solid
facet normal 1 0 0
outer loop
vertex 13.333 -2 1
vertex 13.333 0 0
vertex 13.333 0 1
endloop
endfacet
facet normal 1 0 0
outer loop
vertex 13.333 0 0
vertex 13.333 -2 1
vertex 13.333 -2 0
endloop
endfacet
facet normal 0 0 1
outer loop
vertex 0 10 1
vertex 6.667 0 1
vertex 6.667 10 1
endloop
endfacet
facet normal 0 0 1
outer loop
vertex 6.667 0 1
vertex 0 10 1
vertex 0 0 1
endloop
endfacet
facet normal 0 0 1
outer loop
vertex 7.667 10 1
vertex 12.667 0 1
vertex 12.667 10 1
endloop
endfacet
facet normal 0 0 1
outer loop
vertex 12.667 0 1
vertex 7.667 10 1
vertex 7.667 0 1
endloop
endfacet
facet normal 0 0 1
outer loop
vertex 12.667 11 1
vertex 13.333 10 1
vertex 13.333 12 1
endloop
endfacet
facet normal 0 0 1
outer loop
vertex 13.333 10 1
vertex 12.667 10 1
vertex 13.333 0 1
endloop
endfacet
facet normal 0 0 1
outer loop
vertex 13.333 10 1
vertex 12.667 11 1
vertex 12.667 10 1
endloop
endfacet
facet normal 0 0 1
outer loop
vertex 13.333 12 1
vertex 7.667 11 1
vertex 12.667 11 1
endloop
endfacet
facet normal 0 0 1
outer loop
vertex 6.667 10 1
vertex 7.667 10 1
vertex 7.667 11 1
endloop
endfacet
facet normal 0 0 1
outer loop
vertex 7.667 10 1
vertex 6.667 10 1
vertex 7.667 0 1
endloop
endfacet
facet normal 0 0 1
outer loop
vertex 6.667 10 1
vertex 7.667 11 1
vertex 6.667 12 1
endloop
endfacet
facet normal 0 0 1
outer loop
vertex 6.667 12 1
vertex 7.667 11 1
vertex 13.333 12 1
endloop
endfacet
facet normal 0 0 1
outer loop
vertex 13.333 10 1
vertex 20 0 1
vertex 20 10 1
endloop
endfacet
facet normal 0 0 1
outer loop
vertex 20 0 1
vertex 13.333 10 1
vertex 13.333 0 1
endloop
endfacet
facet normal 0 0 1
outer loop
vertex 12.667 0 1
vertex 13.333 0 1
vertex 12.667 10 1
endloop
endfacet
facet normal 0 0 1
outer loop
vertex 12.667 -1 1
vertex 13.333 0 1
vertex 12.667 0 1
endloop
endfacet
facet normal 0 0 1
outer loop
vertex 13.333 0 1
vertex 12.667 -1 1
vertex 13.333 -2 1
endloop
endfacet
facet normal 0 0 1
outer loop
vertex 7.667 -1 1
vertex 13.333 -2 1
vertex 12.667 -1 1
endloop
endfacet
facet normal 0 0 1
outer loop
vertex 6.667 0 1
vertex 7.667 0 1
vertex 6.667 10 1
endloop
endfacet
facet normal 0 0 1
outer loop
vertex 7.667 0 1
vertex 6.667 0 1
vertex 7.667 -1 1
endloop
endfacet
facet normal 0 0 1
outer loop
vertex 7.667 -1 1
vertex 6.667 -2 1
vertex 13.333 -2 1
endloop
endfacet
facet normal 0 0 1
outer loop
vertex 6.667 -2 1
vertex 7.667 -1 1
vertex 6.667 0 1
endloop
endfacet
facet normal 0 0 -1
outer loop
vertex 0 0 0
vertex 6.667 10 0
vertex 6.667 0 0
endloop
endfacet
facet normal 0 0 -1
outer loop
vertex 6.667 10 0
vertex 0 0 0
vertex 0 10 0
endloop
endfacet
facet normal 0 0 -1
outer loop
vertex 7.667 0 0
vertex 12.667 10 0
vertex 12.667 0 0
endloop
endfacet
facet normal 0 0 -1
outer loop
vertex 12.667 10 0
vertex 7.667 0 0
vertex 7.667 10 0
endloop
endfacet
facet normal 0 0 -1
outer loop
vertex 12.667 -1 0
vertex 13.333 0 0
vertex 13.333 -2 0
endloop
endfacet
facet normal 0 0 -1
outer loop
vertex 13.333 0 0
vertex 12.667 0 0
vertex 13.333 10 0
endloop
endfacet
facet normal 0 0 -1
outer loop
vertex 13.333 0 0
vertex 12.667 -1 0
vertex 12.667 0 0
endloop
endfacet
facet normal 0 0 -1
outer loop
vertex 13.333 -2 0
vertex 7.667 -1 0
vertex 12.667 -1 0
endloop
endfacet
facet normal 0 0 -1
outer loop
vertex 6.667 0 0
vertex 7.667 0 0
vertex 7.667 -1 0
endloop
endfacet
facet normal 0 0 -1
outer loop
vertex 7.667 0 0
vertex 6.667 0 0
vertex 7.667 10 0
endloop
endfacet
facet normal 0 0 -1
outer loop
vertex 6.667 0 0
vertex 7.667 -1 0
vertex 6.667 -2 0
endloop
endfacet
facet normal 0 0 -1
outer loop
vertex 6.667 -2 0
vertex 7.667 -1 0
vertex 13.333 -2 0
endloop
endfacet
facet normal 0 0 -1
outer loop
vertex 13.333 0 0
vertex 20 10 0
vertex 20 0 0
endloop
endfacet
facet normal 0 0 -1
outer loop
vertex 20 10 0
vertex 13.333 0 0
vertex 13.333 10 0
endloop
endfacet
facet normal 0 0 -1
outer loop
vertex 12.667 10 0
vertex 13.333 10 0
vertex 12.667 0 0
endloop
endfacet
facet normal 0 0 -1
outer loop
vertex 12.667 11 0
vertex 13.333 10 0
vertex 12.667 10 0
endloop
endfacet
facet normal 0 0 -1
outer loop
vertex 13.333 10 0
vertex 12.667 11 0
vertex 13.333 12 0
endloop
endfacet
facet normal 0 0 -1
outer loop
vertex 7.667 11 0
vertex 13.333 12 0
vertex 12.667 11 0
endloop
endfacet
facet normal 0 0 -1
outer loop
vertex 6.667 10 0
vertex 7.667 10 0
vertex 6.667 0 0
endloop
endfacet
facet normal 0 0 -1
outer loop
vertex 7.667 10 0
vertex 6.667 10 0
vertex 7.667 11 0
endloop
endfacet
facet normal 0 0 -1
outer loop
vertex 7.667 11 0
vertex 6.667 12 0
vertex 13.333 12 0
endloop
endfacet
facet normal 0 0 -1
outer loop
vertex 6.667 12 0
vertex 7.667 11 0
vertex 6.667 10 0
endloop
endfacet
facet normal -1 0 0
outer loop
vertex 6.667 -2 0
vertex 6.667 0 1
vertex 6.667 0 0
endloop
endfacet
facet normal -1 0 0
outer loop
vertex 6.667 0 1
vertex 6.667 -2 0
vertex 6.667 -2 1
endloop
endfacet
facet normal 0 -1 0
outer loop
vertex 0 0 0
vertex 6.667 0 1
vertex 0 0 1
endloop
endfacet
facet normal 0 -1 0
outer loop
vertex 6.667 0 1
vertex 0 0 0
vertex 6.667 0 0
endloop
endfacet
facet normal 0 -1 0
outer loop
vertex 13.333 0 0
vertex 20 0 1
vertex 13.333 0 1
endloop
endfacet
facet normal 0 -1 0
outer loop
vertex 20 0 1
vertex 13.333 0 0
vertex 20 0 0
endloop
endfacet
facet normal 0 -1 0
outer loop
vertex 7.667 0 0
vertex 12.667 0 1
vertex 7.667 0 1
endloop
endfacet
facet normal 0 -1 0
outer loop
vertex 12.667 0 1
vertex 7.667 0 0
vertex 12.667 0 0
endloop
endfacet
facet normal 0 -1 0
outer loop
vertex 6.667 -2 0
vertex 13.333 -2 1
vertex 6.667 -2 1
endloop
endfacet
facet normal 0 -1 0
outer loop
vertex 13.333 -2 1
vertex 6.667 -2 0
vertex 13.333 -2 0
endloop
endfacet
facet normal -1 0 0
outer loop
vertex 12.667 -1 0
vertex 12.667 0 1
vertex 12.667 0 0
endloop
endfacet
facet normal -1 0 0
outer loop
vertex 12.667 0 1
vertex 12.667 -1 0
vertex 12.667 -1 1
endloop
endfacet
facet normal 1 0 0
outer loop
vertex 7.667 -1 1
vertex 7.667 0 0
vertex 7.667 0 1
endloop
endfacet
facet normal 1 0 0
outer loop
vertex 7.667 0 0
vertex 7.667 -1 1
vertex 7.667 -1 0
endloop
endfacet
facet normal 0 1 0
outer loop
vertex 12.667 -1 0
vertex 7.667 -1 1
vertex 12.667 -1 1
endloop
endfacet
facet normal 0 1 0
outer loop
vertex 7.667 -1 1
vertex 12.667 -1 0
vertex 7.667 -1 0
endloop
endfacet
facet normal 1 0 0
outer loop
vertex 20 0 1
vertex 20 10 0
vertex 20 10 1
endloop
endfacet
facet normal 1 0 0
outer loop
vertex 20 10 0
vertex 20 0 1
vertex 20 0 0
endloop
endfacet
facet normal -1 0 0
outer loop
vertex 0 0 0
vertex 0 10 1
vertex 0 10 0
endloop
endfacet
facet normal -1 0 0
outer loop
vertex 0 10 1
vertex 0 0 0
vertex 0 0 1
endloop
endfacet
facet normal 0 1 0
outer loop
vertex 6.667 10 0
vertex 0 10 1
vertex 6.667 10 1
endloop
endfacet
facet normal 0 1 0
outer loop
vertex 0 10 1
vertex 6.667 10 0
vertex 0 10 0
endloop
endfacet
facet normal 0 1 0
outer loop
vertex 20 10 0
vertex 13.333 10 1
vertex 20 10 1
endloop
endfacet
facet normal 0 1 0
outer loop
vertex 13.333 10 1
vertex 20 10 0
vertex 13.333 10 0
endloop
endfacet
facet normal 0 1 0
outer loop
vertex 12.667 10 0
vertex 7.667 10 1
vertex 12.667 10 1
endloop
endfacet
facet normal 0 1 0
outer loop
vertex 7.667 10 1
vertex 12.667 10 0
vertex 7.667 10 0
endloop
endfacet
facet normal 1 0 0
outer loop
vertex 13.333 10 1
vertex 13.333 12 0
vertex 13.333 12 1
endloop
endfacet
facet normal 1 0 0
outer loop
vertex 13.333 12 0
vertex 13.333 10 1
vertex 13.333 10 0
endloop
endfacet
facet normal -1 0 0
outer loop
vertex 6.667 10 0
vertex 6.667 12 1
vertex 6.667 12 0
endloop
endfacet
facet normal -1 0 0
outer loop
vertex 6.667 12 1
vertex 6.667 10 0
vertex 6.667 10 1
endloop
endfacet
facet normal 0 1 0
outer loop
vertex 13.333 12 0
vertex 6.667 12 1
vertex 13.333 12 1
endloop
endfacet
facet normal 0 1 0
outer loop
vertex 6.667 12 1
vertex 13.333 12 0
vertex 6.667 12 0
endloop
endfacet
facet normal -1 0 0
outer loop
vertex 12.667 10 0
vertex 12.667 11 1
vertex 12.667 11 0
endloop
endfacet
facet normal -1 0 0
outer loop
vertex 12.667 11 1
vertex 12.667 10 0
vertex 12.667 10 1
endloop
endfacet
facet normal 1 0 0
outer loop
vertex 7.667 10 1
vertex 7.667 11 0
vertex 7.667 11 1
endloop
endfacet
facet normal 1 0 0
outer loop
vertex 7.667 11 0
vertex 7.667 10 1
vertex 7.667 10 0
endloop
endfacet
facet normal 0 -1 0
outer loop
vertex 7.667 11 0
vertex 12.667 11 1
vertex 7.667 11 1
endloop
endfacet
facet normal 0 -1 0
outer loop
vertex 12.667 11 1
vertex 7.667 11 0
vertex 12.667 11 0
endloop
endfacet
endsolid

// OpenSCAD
/**
 * top.scad is part of Paper Laptop.
 * It describes a top of the lid of the laptop.
 *
 * @author R. S. Doiel, <rsdoiel@gmail.com>
 * copyright (c) 2016 all rights reserved
 * Released under a BSD 2-clause license
 */
/**
 * bottom.scad is part of Paper Laptop.
 * It describes lower surface of the base.
 *
 * @author R. S. Doiel, <rsdoiel@gmail.com>
 * copyright (c) 2016 all rights reserved
 * Released under a BSD 2-clause license
 */
 
/*
 * bottom - panel demisions for base.
 * @param length is he x value of base rectangle
 * @param width is the y value of the base rectangle
 */
module bottom(length, width) {
    color([0,0,1]) cube([length, width, 1]); 
}

bottom(20, 10, 1);
/**
 * inside-keyboard.scad is part of Paper Laptop.
 * It describes the inside panel mount for keyboard,
 * trackpad, and any other input surface.
 *
 * @author R. S. Doiel, <rsdoiel@gmail.com>
 * copyright (c) 2016 all rights reserved
 * Released under a BSD 2-clause license
 */
module insideKeyboard(length, width) {
    /* main surface for keyboard mounts */
    color([0,0,1]) cube([length, width, 1]); 
    /* handle extension */
    difference() {
        translate([length/3, (width/5)*-1, 0]) {
            color([0,1,0]) cube([length/3, width/5, 1]);
        }    
        translate([(length/3)*1.15, (width/10)*-1, 0]) {
            //color([1,0,0]) 
            cube([(length/3)*0.75, width/10, 1]);
        }
    }
}

insideKeyboard(20, 10);/**
 * inside-screen.scad is part of Paper Laptop.
 * It describes the inner side of the lid holding
 * the LCD panel.
 *
 * @author R. S. Doiel, <rsdoiel@gmail.com>
 * copyright (c) 2016 all rights reserved
 * Released under a BSD 2-clause license
 */
module insideScreen(length, width) {
    translate([0, width, 0]) {
        mirror() {
            rotate(180) {
                /* main surface for keyboard mounts */
                color([0,0,1]) cube([length, width, 1]); 
                /* handle extension */
                difference() {
                    translate([length/3, (width/5)*-1, 0]) {
                        color([0,1,0]) cube([length/3, width/5, 1]);
                    }    
                    translate([(length/3)*1.15, (width/10)*-1, 0]) {
                        //color([1,0,0]) 
                        cube([(length/3)*0.75, width/10, 1]);
                    }
                }
            }
        }
    }
}

insideScreen(20, 10);
/**
 * side-back-bottom.scad is part of Paper Laptop.
 * It describes the bottom back side of the base.
 *
 * @author R. S. Doiel, <rsdoiel@gmail.com>
 * copyright (c) 2016 all rights reserved
 * Released under a BSD 2-clause license
 */
/**
 * side-back-top.scad is part of Paper Laptop.
 * It describes the top back  side of the lid.
 *
 * @author R. S. Doiel, <rsdoiel@gmail.com>
 * copyright (c) 2016 all rights reserved
 * Released under a BSD 2-clause license
 */
/**
 * side-front-bottom.scad is part of Paper Laptop.
 * It describes the bottom front side of the base.
 *
 * @author R. S. Doiel, <rsdoiel@gmail.com>
 * copyright (c) 2016 all rights reserved
 * Released under a BSD 2-clause license
 */
/**
 * side-front-top.scad is part of Paper Laptop.
 * It describes the top front side of the lid.
 *
 * @author R. S. Doiel, <rsdoiel@gmail.com>
 * copyright (c) 2016 all rights reserved
 * Released under a BSD 2-clause license
 */
/**
 * side-left-bottom.scad is part of Paper Laptop.
 * It describes the bottom left side of the base.
 *
 * @author R. S. Doiel, <rsdoiel@gmail.com>
 * copyright (c) 2016 all rights reserved
 * Released under a BSD 2-clause license
 */
/**
 * side-left-top.scad is part of Paper Laptop.
 * It describes the top left side of the lid.
 *
 * @author R. S. Doiel, <rsdoiel@gmail.com>
 * copyright (c) 2016 all rights reserved
 * Released under a BSD 2-clause license
 */
/**
 * side-right-bottom.scad is part of Paper Laptop.
 * It describes the bottom right side of the bad.
 *
 * @author R. S. Doiel, <rsdoiel@gmail.com>
 * copyright (c) 2016 all rights reserved
 * Released under a BSD 2-clause license
 */
/**
 * side-right-top.scad is part of Paper Laptop.
 * It describes the top right side panel of the laptop lid.
 *
 * @author R. S. Doiel, <rsdoiel@gmail.com>
 * copyright (c) 2016 all rights reserved
 * Released under a BSD 2-clause license
 */
